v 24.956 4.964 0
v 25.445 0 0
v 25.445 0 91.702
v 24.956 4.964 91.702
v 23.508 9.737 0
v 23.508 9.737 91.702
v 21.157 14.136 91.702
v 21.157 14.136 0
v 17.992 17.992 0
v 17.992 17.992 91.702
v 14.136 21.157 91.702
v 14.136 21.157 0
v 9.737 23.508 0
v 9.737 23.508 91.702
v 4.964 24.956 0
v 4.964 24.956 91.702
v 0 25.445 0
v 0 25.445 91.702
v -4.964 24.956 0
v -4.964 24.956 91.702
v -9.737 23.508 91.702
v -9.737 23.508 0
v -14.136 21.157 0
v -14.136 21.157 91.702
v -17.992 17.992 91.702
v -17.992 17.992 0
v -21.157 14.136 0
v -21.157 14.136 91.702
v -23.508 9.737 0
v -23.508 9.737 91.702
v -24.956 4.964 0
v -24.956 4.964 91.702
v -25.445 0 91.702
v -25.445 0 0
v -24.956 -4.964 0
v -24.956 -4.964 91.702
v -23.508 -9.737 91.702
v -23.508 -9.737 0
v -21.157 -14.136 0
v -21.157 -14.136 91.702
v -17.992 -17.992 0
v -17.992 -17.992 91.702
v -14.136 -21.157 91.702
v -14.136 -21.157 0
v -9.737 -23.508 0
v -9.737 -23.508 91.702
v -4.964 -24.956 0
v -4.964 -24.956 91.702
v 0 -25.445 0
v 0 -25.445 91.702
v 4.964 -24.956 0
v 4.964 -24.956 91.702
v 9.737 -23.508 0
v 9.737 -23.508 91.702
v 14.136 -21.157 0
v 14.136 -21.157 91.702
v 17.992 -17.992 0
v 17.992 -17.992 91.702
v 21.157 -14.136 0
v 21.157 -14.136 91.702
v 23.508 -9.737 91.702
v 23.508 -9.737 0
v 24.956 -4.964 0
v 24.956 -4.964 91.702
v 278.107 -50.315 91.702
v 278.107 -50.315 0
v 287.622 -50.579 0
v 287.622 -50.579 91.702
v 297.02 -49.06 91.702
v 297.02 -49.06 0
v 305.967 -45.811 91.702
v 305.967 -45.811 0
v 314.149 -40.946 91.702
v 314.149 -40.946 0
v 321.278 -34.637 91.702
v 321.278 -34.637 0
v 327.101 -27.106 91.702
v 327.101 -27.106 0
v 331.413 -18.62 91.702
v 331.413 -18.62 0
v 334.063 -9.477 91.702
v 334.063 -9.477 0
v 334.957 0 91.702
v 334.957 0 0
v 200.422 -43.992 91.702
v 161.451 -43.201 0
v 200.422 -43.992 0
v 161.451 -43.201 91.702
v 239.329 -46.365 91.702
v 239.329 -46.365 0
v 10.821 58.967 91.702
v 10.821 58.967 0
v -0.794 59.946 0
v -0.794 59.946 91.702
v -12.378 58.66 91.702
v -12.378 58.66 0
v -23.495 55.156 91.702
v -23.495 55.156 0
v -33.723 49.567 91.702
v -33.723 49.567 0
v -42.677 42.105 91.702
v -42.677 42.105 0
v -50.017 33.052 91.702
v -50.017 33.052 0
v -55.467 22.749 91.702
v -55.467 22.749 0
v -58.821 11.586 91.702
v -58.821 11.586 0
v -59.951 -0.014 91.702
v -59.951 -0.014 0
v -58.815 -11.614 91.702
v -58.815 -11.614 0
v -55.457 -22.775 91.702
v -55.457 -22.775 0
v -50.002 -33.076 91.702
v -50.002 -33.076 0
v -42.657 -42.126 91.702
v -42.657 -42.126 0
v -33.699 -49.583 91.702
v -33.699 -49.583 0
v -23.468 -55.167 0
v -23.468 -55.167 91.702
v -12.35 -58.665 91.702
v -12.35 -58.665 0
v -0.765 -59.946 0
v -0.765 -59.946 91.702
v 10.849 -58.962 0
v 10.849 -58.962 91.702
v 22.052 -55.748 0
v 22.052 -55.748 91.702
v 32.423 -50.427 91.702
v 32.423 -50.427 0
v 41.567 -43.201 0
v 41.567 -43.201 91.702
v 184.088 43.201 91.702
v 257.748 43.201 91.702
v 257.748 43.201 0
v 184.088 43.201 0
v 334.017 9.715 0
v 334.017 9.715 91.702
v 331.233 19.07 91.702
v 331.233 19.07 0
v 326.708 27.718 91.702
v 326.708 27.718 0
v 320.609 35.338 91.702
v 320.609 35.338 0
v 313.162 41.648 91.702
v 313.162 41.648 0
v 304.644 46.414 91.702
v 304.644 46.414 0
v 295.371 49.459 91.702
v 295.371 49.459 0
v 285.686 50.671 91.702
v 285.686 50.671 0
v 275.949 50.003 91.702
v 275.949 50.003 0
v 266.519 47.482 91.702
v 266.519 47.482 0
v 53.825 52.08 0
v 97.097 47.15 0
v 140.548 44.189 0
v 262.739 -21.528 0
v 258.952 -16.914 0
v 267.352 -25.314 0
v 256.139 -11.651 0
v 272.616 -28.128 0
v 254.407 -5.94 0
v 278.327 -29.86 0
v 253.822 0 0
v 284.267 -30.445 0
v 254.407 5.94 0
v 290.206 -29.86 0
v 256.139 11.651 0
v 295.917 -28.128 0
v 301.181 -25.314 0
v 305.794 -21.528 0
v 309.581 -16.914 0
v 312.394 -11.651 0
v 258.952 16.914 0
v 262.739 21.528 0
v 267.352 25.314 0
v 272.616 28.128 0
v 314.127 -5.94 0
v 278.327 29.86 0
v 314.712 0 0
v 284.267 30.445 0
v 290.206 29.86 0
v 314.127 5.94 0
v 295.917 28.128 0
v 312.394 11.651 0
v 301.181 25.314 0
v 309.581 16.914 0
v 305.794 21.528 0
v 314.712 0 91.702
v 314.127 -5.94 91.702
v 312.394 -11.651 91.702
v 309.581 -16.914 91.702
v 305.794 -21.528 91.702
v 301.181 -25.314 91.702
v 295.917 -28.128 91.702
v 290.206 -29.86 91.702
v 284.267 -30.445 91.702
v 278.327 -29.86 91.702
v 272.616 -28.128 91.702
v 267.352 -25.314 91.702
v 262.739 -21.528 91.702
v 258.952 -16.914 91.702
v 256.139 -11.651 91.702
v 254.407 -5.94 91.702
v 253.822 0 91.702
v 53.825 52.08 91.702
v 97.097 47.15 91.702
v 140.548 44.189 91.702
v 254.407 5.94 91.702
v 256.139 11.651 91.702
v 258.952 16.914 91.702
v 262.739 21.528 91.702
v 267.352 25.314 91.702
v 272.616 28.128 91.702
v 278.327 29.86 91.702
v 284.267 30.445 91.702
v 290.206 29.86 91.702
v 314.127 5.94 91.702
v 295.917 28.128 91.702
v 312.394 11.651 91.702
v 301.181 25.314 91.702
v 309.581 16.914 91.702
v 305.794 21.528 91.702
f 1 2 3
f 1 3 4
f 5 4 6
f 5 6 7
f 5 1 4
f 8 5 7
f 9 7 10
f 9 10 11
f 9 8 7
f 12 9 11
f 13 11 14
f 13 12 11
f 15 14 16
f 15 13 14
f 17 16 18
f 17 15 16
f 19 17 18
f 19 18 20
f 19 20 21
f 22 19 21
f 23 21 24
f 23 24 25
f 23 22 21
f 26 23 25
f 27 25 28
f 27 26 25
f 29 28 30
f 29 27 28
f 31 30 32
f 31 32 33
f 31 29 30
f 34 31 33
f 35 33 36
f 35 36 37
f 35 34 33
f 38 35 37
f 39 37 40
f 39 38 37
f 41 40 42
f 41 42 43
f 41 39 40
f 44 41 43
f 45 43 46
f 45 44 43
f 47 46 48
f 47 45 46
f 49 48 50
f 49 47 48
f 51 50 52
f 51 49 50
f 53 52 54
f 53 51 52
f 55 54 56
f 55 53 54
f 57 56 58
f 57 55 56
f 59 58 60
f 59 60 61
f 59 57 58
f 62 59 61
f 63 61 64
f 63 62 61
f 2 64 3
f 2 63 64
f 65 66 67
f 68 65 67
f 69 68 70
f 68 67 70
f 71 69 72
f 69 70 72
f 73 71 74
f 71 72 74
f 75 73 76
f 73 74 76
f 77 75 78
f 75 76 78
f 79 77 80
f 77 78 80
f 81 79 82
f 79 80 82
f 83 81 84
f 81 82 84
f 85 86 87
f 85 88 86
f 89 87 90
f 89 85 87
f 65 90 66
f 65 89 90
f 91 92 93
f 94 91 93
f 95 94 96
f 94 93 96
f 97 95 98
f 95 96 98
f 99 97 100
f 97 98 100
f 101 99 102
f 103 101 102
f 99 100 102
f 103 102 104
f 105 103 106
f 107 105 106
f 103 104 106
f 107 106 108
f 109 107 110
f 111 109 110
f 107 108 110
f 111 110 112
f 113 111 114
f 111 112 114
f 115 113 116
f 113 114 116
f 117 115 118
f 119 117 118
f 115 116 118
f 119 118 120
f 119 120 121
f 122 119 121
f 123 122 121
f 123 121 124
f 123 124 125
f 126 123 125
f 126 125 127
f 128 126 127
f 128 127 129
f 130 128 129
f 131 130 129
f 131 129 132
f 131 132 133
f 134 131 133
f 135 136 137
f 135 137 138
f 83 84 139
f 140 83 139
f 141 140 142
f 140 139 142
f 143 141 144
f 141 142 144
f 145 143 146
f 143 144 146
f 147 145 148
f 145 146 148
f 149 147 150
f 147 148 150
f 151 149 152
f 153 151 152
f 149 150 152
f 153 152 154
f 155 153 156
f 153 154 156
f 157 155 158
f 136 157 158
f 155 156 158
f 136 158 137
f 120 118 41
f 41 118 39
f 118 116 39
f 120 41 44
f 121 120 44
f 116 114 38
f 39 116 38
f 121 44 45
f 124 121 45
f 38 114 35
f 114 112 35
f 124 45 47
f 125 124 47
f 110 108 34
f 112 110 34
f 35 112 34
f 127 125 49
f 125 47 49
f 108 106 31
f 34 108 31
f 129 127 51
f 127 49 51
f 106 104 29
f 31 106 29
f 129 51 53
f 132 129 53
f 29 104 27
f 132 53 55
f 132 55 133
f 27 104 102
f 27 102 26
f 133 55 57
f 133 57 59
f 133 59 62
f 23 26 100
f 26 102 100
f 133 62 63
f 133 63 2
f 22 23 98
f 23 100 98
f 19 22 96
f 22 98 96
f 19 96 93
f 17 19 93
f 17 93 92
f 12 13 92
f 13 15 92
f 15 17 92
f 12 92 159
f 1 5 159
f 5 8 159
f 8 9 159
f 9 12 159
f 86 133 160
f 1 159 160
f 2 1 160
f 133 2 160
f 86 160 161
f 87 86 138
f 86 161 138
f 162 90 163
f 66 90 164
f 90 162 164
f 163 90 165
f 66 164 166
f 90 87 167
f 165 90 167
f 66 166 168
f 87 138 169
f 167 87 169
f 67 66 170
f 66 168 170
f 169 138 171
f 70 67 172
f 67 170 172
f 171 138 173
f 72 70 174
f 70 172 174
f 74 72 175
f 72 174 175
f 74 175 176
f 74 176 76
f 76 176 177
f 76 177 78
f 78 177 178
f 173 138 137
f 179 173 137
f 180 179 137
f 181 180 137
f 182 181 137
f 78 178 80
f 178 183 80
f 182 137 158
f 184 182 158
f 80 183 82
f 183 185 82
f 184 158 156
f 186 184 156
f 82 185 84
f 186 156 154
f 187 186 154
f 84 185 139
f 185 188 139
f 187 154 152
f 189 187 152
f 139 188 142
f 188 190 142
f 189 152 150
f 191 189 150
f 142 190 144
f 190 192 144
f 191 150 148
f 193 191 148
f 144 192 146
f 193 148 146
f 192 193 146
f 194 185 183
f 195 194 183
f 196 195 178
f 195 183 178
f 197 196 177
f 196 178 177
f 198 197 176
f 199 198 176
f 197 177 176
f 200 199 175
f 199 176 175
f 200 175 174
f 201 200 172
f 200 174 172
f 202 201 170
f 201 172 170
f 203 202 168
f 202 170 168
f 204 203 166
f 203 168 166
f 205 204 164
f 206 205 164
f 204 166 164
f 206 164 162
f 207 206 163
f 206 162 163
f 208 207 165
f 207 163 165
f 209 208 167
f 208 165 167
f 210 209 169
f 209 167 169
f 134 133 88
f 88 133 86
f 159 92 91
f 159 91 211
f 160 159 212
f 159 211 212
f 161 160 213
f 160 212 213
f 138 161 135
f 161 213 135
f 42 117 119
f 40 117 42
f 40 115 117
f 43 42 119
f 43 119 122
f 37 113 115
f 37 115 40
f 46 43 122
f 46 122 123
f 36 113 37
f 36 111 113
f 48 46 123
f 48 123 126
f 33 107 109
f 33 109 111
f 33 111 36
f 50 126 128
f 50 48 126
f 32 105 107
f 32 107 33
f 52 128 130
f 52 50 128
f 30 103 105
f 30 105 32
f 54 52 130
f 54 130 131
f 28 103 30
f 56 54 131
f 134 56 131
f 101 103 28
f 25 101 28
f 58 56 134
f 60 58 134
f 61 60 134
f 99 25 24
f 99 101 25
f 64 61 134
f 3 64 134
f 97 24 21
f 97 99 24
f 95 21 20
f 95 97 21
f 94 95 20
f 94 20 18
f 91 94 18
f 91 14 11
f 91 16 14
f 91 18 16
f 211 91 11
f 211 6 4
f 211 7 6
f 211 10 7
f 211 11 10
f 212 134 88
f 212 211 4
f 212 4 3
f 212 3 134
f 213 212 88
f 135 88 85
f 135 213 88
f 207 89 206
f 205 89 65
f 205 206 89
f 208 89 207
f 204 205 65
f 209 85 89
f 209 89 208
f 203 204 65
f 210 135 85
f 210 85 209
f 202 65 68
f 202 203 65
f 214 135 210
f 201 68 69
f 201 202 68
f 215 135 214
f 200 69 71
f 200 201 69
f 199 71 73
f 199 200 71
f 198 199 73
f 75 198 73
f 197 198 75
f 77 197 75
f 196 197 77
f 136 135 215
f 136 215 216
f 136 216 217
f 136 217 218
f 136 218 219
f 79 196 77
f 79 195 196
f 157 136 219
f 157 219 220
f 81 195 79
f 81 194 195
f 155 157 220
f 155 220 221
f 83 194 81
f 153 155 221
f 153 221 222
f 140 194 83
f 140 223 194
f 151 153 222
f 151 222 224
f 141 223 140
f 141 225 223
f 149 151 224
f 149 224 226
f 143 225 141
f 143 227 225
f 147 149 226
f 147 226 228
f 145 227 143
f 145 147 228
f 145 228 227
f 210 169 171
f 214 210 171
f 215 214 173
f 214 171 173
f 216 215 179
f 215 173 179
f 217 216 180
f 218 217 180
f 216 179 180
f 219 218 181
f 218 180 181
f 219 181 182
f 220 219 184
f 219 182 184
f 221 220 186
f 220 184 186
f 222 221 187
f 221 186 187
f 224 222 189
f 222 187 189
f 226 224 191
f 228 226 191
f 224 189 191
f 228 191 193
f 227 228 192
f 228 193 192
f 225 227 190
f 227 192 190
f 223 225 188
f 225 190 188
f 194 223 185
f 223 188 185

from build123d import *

# Parameters (mm, degrees)
F0_R     = 25.444736
F1_DEPTH = 91.702167
F2_R     = 959.987855


with BuildPart() as f1:
    # F0 (on Top) → F1 (new body)
    with BuildSketch(Plane.XY):
        with BuildLine():
            ThreePointArc((41.567442, 43.200706), (55.16418, 23.474804), (59.951257, 0))
            Line((59.951257, 0), (233.576013, 0))
            ThreePointArc((233.576013, 0), (240.029875, 24.751712), (257.748065, 43.200706))
            Line((257.748065, 43.200706), (41.567442, 43.200706))
        make_face()
        with BuildLine():
            ThreePointArc((257.748065, 43.200706), (240.029875, 24.751712), (233.576013, 0))
            ThreePointArc((233.576013, 0), (240.029875, -24.751712), (257.748065, -43.200706))
            ThreePointArc((257.748065, -43.200706), (309.018274, -44.236686), (334.957109, 0))
            ThreePointArc((334.957109, 0), (309.018274, 44.236686), (257.748065, 43.200706))
        make_face()
        with BuildLine():
            ThreePointArc((314.711569, 0), (284.266561, -30.445007), (253.821554, 0))
            ThreePointArc((253.821554, 0), (284.266561, 30.445007), (314.711569, 0))
        make_face(mode=Mode.SUBTRACT)
        with BuildLine():
            Line((233.576013, 0), (59.951257, 0))
            ThreePointArc((59.951257, 0), (55.16418, -23.474804), (41.567442, -43.200706))
            Line((41.567442, -43.200706), (257.748065, -43.200706))
            ThreePointArc((257.748065, -43.200706), (240.029875, -24.751712), (233.576013, 0))
        make_face()
        with BuildLine():
            ThreePointArc((41.567442, -43.200706), (55.16418, -23.474804), (59.951257, 0))
            ThreePointArc((59.951257, 0), (55.16418, 23.474804), (41.567442, 43.200706))
            ThreePointArc((41.567442, 43.200706), (-59.951257, 0), (41.567442, -43.200706))
        make_face()
        Circle(F0_R, mode=Mode.SUBTRACT)
    extrude(amount=F1_DEPTH)

    # F2
    f2_edges = [f1.edges().sort_by_distance(p)[0] for p in [
        (257.748065, -43.200706, 45.851083),
        (41.567442, 43.200706, 45.851083),
    ]]
    fillet(f2_edges, radius=F2_R)


solid = f1.part
